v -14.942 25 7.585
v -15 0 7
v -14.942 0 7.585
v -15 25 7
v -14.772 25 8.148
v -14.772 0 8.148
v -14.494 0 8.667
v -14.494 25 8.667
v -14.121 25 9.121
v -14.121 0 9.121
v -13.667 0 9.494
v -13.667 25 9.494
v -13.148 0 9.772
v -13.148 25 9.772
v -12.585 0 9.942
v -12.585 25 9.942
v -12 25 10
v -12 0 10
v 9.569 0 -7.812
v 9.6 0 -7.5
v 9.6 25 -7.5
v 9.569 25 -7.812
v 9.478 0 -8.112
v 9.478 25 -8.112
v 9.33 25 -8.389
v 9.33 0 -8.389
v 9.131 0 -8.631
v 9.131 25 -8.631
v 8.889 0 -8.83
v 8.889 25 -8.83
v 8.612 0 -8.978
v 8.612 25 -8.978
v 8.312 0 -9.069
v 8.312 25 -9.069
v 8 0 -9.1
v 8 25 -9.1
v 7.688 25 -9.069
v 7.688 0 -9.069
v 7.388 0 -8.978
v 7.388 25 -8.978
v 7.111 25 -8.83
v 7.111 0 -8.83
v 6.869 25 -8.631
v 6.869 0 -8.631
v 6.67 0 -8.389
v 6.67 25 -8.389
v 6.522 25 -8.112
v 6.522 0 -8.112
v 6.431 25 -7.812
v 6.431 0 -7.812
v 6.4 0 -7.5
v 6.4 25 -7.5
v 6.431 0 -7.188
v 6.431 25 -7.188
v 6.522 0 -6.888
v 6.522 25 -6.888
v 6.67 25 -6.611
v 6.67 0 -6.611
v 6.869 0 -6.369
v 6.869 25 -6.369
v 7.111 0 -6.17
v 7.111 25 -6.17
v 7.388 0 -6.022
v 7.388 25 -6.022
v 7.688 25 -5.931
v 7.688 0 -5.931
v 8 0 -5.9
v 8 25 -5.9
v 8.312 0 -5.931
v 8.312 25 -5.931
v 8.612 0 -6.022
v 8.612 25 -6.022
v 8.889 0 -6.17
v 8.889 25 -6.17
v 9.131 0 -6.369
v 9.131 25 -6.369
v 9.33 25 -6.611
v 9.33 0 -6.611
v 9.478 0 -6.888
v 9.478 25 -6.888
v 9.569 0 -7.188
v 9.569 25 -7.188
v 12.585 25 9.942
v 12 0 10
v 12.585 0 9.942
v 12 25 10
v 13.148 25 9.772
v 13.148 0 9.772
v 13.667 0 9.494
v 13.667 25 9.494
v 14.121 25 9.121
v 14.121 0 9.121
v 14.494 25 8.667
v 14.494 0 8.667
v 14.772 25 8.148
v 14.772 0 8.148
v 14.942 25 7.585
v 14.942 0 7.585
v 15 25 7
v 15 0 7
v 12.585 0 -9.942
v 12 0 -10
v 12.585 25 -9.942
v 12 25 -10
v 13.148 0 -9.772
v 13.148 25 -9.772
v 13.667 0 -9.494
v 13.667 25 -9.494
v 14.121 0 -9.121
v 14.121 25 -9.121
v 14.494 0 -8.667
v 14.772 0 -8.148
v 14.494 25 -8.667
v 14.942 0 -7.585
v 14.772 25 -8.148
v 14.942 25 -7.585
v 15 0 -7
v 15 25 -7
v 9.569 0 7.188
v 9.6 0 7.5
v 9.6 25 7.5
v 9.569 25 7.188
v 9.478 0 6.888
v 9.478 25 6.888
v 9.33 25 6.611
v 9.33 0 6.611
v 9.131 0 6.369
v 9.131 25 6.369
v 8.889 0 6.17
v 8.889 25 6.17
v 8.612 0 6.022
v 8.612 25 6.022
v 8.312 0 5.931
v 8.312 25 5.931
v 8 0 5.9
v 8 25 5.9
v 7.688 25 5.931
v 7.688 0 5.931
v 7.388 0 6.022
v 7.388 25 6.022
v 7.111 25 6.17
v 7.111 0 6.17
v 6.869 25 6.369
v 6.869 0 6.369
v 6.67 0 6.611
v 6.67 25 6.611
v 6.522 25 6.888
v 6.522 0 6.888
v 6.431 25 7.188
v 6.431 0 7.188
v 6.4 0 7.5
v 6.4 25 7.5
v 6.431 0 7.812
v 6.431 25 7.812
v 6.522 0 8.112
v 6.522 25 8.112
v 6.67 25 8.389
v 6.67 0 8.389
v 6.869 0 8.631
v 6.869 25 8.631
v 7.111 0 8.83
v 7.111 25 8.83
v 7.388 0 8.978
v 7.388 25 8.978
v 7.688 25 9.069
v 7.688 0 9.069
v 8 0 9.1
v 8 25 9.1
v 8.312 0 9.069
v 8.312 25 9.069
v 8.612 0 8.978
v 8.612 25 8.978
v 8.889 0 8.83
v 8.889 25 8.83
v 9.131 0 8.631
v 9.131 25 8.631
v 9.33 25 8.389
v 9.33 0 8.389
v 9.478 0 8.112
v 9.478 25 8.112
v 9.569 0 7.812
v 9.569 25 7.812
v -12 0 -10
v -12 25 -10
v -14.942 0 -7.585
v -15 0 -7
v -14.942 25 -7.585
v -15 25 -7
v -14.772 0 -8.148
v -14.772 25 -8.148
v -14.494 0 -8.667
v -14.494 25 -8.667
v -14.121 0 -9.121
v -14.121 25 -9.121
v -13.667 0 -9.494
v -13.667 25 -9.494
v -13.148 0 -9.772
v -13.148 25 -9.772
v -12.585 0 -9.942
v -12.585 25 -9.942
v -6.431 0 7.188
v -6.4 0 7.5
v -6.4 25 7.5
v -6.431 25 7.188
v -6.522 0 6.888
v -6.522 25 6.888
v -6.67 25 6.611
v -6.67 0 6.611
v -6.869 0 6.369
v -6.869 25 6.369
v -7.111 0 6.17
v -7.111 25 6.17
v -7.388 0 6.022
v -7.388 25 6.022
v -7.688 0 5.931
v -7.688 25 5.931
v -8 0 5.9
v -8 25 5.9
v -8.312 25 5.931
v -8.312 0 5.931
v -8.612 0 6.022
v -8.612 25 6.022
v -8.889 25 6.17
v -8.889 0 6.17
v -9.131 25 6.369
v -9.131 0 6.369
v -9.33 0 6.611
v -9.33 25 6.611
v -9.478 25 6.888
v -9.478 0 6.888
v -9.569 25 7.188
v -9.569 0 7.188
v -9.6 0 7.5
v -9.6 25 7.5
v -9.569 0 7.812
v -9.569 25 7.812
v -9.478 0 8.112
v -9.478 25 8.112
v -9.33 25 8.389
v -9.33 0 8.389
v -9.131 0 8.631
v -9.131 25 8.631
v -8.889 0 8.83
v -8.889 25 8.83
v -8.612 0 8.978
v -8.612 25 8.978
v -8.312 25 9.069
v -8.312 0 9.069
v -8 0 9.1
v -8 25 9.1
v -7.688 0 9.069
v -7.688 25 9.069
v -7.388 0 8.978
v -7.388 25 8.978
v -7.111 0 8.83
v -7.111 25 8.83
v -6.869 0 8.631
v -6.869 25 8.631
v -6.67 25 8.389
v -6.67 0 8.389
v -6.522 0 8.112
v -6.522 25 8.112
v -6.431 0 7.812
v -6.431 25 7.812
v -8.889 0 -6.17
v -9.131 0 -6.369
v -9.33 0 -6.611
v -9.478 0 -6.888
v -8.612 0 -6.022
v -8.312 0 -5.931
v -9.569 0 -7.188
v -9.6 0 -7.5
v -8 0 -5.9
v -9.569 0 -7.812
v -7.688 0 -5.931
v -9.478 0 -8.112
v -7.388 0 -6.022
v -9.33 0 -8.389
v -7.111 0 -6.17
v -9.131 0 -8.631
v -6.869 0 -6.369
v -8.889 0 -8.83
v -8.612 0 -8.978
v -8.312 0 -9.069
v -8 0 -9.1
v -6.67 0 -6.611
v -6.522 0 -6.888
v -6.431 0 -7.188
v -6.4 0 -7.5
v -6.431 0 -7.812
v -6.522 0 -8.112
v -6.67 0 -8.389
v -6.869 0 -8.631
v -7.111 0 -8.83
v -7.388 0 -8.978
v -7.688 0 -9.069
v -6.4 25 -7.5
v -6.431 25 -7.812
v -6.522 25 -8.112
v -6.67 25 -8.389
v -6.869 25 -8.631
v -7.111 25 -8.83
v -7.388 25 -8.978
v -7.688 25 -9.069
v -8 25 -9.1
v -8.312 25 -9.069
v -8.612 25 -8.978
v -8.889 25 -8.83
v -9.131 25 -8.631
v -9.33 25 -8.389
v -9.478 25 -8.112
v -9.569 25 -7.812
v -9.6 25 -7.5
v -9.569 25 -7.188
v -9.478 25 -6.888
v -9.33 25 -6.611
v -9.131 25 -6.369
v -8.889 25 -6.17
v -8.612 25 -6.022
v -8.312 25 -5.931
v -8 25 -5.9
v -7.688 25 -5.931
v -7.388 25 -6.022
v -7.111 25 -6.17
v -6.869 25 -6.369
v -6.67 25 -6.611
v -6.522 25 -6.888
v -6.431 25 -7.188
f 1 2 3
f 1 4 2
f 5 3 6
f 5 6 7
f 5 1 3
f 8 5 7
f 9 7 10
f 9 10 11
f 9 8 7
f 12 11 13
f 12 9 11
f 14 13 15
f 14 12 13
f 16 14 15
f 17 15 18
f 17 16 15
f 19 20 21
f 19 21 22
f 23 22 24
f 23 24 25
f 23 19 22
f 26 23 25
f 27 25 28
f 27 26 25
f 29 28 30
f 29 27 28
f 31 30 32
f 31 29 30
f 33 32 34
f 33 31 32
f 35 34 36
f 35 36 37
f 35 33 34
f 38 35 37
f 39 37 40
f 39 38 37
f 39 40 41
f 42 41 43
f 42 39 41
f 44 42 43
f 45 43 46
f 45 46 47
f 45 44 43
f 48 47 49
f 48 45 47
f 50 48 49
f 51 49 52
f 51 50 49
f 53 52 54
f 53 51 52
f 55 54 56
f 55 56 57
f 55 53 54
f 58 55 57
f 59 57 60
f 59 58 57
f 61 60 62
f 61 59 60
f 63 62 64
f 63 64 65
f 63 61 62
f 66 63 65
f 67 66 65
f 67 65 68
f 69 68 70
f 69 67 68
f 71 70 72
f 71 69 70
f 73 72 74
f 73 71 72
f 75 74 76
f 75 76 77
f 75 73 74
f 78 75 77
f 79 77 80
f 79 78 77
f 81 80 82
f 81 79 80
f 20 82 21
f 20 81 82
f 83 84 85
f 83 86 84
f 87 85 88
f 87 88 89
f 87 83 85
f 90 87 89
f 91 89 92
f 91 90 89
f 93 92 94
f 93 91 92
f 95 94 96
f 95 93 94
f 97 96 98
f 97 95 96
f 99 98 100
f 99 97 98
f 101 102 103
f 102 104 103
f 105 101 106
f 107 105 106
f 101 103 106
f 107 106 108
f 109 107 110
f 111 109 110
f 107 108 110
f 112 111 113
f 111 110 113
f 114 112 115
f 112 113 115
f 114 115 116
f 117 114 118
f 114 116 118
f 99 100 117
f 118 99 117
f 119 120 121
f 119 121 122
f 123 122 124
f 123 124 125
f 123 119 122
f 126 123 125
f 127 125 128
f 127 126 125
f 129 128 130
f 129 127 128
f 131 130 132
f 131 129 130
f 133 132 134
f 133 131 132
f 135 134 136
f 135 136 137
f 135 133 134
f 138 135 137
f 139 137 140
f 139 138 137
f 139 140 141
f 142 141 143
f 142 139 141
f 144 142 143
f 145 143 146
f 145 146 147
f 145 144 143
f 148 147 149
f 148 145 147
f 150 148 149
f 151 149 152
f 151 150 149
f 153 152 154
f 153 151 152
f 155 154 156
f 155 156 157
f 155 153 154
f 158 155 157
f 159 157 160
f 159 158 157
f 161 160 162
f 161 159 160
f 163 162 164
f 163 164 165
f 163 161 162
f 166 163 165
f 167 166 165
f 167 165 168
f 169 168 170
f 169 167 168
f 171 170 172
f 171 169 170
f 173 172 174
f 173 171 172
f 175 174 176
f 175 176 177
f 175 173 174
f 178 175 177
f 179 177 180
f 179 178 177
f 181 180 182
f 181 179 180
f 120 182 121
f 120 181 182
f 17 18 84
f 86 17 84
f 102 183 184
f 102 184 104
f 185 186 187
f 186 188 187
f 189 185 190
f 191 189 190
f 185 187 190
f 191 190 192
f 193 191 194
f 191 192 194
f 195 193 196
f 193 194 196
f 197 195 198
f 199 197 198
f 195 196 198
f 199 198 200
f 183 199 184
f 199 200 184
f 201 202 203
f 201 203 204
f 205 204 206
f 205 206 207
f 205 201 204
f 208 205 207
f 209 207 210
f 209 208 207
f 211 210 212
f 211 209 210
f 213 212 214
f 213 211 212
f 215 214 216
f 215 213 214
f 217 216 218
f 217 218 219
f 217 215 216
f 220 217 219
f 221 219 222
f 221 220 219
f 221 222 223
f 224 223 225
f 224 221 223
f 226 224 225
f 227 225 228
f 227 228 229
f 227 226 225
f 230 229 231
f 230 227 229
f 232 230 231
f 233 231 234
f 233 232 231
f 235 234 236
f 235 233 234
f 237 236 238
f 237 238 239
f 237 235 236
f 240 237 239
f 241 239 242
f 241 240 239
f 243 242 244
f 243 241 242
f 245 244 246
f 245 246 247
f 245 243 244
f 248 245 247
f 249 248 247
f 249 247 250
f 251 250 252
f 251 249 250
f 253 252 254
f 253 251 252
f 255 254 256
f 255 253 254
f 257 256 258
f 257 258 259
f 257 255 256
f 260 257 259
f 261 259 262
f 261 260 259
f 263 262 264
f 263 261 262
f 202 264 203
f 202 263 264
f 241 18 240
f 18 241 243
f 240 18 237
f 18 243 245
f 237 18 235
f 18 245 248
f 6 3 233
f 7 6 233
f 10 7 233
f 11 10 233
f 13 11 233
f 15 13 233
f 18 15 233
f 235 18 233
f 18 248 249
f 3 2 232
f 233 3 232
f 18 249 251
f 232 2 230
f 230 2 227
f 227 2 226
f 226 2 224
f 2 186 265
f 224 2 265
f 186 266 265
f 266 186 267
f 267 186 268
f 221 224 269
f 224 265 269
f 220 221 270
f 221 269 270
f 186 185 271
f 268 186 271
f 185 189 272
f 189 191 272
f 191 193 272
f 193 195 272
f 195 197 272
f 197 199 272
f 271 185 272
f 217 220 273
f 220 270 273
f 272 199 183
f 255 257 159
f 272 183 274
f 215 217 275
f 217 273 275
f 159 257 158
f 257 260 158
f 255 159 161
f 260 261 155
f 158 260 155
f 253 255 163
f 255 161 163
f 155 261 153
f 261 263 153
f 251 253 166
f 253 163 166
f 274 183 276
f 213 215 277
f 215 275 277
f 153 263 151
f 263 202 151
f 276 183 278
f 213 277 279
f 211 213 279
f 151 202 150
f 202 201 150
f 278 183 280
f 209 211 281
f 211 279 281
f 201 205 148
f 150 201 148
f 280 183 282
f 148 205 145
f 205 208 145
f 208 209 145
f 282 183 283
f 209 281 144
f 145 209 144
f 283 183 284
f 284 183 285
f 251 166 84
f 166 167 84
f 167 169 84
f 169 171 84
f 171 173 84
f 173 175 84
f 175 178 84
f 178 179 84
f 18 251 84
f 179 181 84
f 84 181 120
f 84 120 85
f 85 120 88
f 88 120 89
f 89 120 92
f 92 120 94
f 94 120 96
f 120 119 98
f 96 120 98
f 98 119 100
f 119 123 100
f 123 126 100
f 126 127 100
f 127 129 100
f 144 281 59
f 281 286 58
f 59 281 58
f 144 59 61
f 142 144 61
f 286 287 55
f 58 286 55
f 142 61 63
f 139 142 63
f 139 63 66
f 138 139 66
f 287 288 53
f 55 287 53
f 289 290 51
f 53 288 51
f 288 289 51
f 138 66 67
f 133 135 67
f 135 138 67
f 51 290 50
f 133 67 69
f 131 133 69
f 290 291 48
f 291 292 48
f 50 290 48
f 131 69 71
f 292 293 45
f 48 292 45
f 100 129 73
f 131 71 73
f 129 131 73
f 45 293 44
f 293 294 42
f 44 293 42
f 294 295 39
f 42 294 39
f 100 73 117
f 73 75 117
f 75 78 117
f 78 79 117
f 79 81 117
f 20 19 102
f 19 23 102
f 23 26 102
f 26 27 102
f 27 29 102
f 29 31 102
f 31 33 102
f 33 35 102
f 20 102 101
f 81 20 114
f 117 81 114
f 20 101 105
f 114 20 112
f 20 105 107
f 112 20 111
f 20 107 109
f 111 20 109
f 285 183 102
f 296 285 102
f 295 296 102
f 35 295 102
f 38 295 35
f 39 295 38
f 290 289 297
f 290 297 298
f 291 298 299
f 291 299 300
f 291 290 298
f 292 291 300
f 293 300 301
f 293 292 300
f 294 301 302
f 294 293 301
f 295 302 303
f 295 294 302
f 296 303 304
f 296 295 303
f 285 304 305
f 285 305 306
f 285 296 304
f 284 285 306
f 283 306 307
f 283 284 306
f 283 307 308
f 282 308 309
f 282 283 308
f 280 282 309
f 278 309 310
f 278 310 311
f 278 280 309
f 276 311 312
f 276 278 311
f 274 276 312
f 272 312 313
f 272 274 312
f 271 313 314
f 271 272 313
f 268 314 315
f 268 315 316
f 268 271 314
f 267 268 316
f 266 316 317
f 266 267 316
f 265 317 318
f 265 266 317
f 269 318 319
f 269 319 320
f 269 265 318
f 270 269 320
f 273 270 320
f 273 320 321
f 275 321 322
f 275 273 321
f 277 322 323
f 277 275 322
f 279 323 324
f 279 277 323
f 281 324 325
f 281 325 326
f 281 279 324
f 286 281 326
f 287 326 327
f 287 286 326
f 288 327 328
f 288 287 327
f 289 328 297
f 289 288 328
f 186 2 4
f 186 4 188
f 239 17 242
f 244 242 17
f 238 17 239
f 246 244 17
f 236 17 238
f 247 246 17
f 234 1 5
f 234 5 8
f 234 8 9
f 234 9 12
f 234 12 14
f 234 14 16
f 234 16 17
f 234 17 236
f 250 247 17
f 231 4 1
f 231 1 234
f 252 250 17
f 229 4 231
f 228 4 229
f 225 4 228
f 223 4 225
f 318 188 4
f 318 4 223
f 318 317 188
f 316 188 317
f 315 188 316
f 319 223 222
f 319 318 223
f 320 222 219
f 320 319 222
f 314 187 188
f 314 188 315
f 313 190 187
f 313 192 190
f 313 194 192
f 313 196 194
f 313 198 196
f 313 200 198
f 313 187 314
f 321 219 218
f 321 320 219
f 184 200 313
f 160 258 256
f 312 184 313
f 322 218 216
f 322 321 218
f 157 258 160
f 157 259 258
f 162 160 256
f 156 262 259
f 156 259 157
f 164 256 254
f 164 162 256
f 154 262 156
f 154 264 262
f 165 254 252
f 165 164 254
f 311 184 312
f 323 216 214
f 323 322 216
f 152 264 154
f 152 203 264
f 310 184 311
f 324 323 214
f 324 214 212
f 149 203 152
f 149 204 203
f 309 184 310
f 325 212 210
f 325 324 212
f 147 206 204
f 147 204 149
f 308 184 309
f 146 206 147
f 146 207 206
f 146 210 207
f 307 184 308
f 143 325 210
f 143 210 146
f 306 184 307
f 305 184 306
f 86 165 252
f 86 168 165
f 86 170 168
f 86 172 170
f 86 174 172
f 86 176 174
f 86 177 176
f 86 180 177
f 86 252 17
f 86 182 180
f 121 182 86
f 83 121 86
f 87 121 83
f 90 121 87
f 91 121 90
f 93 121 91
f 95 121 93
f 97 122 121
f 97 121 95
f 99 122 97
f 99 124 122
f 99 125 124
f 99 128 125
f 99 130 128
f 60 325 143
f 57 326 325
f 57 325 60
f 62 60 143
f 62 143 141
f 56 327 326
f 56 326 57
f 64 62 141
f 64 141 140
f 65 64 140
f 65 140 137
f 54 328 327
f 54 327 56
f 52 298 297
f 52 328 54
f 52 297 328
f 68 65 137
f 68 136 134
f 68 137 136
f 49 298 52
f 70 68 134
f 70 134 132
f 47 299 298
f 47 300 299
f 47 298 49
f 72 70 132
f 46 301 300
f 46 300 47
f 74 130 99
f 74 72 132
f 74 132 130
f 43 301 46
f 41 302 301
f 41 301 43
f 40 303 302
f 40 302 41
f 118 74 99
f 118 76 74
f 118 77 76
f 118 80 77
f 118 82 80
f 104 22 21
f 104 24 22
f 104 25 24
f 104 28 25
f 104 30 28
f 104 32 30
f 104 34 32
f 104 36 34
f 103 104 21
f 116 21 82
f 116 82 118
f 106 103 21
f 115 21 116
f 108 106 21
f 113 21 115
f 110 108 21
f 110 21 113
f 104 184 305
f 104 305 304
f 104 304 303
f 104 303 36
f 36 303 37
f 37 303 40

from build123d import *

# Parameters (mm, degrees)
SKETCH_1_W      = 30
SKETCH_1_H      = 20
SKETCH_1_R      = 1.6
EXTRUDE_1_DEPTH = 25
FILLET_1_R      = 3


with BuildPart() as part:
    # 草图1 → 凸台-拉伸1 (new body)
    with BuildSketch(Plane(origin=(0, 0, 0), x_dir=(1, 0, 0), z_dir=(0, 1, 0))):
        Rectangle(SKETCH_1_W, SKETCH_1_H)
        with Locations((-8, 7.5)):
            Circle(SKETCH_1_R, mode=Mode.SUBTRACT)
        with Locations((-8, -7.5)):
            Circle(SKETCH_1_R, mode=Mode.SUBTRACT)
        with Locations((8, -7.5)):
            Circle(SKETCH_1_R, mode=Mode.SUBTRACT)
        with Locations((8, 7.5)):
            Circle(SKETCH_1_R, mode=Mode.SUBTRACT)
    extrude(amount=EXTRUDE_1_DEPTH)

    # 圆角1
    fillet_1_edges = [part.edges().sort_by_distance(p)[0] for p in [
        (15, 12.5, 10),
        (-15, 12.5, 10),
        (-15, 12.5, -10),
        (15, 12.5, -10),
    ]]
    fillet(fillet_1_edges, radius=FILLET_1_R)


solid = part.part
